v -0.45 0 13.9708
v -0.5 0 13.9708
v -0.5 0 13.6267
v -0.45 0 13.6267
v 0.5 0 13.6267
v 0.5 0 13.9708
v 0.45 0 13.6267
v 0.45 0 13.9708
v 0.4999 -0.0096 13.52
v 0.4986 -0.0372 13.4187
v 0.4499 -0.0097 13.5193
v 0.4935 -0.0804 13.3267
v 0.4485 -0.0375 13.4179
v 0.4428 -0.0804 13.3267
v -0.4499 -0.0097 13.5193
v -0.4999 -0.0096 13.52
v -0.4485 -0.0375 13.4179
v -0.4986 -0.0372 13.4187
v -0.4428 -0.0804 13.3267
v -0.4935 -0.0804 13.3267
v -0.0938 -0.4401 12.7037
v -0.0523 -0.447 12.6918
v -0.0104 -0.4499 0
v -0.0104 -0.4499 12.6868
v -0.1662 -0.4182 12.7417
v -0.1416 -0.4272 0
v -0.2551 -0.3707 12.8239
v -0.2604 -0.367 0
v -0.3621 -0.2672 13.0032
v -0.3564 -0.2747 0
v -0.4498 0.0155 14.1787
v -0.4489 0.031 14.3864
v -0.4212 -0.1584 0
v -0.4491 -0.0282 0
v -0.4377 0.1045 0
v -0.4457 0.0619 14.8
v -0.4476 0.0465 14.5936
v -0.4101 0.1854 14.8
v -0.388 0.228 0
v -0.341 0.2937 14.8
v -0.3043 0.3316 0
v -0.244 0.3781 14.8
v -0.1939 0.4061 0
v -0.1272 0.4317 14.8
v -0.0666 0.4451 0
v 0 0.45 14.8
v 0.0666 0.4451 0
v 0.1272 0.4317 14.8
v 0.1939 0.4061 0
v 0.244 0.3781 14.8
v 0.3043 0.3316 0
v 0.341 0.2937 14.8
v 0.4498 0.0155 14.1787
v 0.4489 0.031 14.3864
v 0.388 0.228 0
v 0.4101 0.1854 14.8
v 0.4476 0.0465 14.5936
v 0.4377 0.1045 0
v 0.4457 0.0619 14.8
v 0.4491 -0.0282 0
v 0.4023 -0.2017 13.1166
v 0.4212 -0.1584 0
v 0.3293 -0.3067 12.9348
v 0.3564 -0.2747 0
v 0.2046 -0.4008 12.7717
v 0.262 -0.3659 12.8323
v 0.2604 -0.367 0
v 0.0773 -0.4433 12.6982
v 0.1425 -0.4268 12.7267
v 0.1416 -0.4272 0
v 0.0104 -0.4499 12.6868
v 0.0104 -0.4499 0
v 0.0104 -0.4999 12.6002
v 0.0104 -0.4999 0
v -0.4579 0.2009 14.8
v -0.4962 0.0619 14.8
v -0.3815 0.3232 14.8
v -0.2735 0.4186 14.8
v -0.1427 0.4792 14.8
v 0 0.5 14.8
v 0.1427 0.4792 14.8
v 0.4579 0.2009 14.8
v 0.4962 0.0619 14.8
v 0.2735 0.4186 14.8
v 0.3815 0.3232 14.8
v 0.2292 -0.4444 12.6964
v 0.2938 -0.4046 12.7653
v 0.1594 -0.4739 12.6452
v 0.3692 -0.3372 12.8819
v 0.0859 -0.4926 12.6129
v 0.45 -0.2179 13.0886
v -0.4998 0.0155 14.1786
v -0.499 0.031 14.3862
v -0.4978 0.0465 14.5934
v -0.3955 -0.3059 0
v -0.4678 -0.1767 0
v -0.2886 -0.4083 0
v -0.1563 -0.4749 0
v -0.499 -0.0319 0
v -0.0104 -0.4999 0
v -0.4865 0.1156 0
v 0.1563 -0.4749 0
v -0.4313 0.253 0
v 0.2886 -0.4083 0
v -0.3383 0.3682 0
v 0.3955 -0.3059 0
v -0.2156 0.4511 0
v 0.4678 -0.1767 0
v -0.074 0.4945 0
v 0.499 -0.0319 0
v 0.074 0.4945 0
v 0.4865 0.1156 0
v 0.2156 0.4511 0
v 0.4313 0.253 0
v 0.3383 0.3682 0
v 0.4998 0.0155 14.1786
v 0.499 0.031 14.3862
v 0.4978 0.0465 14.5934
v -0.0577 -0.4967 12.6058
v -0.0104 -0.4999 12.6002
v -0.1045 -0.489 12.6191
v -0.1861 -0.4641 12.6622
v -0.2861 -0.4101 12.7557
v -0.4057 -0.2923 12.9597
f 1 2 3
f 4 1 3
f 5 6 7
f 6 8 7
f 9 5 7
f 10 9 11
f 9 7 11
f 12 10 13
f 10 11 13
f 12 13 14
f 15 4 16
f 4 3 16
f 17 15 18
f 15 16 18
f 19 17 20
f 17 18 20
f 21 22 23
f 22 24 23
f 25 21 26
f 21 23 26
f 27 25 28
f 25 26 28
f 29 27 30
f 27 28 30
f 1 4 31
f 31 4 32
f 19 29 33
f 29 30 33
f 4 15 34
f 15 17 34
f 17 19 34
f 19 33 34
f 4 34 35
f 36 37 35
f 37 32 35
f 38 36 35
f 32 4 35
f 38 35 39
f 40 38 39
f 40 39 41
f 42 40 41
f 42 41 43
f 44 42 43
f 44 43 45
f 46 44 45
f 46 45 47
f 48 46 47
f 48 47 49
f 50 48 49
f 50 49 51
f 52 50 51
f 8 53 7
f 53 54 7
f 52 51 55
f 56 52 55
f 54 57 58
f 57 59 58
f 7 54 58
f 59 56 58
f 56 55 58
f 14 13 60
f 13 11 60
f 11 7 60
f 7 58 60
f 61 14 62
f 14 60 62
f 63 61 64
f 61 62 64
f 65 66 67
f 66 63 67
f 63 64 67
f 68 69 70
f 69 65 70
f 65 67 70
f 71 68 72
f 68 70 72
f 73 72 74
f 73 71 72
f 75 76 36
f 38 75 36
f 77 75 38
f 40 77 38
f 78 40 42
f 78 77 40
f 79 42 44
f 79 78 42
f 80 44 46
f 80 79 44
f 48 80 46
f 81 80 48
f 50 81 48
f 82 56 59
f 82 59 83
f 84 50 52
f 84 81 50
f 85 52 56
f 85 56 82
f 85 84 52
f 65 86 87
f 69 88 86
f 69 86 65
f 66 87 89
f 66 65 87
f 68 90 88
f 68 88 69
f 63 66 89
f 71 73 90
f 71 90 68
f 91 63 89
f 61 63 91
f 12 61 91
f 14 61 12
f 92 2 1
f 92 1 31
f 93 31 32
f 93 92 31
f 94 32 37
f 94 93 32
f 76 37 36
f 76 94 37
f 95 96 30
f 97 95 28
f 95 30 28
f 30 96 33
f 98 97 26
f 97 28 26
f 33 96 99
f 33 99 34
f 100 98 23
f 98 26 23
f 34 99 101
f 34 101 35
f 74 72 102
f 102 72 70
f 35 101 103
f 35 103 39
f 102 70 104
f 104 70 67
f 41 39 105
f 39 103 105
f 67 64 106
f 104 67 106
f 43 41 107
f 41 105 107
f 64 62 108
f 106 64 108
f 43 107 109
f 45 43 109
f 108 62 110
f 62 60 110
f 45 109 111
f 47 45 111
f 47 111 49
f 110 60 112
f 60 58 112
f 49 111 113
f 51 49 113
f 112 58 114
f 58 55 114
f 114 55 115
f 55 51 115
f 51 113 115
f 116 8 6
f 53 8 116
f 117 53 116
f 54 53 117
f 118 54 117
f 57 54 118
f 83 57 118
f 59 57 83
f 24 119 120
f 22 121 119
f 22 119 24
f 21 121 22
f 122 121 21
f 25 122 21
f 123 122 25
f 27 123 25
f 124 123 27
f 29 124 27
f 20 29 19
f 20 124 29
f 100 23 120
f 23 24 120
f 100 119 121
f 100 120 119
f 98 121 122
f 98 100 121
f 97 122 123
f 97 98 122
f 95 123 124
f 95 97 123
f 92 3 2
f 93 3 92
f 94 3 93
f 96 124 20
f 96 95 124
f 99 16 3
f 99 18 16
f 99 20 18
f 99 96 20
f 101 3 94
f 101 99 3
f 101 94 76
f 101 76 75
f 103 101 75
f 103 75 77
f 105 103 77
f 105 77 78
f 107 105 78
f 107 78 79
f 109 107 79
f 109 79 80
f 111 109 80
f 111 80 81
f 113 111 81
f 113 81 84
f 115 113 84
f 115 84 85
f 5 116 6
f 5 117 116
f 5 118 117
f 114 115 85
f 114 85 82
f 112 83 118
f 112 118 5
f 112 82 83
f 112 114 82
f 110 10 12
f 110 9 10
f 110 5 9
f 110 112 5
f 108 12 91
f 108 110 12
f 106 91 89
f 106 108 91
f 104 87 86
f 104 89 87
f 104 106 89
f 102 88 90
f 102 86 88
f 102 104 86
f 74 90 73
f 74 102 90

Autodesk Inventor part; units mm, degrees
ref_plane "YZ Plane" through (0, 0, 0) normal (1, 0, 0) x (0, 1, 0)
ref_plane "XZ Plane" through (0, 0, 0) normal (0, 1, 0) x (-1, 0, 0)
ref_plane "XY Plane" through (0, 0, 0) normal (0, 0, 1) x (1, 0, 0)
sketch "Skizze1" plane through (0, 0, 0) normal (0, 0, 1) x (1, 0, 0)
  arc A0 (0.0104, -0.4999) -> (-0.0104, -0.4999) centre (0, 0) ccw
  arc A1 (0.0104, -0.4499) -> (-0.0104, -0.4499) centre (0, 0) ccw
  line L0 (-0.0104, -0.4499) -> (-0.0104, -0.4999)
  line L1 (0.0104, -0.4499) -> (0.0104, -0.4999)
  point P0 (-0.0054, 0)
  point P1 (0.0054, 0)
  dimension "d0" = 1
  dimension "d1" = 0.9
  dimension "d18" = 0.0209
extrude "Extrusion1" add sketch "Skizze1" along normal blind 14.8
sketch "Skizze2" plane through (0, 0, 0) normal (1, 0, 0) x (0, 1, 0)
  line L0 (-0.5, 0) -> (-0.5, 14.8)
  line L1 (-0.5, 12.6) -> (-0.0804, 13.3267)
  line L2 (0, 13.9708) -> (0, 13.6267)
  line L3 (0, 13.9708) -> (0.0666, 14.8632)
  arc A0 (-0.0804, 13.3267) -> (0, 13.6267) centre (-0.6, 13.6267) ccw
  line L4 (0.45, 0) -> (0.45, 14.8) projected
  line L5 (0.45, 14.8) -> (0.5, 14.8) projected
  line L6 (0.5, 14.8) -> (0.5, 0) projected
  line L7 (0.5, 0) -> (0.45, 0) projected
  arc A1 (0.0666, 14.8632) -> (-0.5, 12.6) centre (-0.4472, 13.7893) ccw
  point P0 (0, 0)
  point P1 (0, 13.466)
  dimension "d8" = 30
  dimension "d10" = 0.6
extrude "Extrusion3" cut sketch "Skizze2" along normal through all both and the other way through all contours A1 L3 L2 A0 L1
properties part number "pin"
